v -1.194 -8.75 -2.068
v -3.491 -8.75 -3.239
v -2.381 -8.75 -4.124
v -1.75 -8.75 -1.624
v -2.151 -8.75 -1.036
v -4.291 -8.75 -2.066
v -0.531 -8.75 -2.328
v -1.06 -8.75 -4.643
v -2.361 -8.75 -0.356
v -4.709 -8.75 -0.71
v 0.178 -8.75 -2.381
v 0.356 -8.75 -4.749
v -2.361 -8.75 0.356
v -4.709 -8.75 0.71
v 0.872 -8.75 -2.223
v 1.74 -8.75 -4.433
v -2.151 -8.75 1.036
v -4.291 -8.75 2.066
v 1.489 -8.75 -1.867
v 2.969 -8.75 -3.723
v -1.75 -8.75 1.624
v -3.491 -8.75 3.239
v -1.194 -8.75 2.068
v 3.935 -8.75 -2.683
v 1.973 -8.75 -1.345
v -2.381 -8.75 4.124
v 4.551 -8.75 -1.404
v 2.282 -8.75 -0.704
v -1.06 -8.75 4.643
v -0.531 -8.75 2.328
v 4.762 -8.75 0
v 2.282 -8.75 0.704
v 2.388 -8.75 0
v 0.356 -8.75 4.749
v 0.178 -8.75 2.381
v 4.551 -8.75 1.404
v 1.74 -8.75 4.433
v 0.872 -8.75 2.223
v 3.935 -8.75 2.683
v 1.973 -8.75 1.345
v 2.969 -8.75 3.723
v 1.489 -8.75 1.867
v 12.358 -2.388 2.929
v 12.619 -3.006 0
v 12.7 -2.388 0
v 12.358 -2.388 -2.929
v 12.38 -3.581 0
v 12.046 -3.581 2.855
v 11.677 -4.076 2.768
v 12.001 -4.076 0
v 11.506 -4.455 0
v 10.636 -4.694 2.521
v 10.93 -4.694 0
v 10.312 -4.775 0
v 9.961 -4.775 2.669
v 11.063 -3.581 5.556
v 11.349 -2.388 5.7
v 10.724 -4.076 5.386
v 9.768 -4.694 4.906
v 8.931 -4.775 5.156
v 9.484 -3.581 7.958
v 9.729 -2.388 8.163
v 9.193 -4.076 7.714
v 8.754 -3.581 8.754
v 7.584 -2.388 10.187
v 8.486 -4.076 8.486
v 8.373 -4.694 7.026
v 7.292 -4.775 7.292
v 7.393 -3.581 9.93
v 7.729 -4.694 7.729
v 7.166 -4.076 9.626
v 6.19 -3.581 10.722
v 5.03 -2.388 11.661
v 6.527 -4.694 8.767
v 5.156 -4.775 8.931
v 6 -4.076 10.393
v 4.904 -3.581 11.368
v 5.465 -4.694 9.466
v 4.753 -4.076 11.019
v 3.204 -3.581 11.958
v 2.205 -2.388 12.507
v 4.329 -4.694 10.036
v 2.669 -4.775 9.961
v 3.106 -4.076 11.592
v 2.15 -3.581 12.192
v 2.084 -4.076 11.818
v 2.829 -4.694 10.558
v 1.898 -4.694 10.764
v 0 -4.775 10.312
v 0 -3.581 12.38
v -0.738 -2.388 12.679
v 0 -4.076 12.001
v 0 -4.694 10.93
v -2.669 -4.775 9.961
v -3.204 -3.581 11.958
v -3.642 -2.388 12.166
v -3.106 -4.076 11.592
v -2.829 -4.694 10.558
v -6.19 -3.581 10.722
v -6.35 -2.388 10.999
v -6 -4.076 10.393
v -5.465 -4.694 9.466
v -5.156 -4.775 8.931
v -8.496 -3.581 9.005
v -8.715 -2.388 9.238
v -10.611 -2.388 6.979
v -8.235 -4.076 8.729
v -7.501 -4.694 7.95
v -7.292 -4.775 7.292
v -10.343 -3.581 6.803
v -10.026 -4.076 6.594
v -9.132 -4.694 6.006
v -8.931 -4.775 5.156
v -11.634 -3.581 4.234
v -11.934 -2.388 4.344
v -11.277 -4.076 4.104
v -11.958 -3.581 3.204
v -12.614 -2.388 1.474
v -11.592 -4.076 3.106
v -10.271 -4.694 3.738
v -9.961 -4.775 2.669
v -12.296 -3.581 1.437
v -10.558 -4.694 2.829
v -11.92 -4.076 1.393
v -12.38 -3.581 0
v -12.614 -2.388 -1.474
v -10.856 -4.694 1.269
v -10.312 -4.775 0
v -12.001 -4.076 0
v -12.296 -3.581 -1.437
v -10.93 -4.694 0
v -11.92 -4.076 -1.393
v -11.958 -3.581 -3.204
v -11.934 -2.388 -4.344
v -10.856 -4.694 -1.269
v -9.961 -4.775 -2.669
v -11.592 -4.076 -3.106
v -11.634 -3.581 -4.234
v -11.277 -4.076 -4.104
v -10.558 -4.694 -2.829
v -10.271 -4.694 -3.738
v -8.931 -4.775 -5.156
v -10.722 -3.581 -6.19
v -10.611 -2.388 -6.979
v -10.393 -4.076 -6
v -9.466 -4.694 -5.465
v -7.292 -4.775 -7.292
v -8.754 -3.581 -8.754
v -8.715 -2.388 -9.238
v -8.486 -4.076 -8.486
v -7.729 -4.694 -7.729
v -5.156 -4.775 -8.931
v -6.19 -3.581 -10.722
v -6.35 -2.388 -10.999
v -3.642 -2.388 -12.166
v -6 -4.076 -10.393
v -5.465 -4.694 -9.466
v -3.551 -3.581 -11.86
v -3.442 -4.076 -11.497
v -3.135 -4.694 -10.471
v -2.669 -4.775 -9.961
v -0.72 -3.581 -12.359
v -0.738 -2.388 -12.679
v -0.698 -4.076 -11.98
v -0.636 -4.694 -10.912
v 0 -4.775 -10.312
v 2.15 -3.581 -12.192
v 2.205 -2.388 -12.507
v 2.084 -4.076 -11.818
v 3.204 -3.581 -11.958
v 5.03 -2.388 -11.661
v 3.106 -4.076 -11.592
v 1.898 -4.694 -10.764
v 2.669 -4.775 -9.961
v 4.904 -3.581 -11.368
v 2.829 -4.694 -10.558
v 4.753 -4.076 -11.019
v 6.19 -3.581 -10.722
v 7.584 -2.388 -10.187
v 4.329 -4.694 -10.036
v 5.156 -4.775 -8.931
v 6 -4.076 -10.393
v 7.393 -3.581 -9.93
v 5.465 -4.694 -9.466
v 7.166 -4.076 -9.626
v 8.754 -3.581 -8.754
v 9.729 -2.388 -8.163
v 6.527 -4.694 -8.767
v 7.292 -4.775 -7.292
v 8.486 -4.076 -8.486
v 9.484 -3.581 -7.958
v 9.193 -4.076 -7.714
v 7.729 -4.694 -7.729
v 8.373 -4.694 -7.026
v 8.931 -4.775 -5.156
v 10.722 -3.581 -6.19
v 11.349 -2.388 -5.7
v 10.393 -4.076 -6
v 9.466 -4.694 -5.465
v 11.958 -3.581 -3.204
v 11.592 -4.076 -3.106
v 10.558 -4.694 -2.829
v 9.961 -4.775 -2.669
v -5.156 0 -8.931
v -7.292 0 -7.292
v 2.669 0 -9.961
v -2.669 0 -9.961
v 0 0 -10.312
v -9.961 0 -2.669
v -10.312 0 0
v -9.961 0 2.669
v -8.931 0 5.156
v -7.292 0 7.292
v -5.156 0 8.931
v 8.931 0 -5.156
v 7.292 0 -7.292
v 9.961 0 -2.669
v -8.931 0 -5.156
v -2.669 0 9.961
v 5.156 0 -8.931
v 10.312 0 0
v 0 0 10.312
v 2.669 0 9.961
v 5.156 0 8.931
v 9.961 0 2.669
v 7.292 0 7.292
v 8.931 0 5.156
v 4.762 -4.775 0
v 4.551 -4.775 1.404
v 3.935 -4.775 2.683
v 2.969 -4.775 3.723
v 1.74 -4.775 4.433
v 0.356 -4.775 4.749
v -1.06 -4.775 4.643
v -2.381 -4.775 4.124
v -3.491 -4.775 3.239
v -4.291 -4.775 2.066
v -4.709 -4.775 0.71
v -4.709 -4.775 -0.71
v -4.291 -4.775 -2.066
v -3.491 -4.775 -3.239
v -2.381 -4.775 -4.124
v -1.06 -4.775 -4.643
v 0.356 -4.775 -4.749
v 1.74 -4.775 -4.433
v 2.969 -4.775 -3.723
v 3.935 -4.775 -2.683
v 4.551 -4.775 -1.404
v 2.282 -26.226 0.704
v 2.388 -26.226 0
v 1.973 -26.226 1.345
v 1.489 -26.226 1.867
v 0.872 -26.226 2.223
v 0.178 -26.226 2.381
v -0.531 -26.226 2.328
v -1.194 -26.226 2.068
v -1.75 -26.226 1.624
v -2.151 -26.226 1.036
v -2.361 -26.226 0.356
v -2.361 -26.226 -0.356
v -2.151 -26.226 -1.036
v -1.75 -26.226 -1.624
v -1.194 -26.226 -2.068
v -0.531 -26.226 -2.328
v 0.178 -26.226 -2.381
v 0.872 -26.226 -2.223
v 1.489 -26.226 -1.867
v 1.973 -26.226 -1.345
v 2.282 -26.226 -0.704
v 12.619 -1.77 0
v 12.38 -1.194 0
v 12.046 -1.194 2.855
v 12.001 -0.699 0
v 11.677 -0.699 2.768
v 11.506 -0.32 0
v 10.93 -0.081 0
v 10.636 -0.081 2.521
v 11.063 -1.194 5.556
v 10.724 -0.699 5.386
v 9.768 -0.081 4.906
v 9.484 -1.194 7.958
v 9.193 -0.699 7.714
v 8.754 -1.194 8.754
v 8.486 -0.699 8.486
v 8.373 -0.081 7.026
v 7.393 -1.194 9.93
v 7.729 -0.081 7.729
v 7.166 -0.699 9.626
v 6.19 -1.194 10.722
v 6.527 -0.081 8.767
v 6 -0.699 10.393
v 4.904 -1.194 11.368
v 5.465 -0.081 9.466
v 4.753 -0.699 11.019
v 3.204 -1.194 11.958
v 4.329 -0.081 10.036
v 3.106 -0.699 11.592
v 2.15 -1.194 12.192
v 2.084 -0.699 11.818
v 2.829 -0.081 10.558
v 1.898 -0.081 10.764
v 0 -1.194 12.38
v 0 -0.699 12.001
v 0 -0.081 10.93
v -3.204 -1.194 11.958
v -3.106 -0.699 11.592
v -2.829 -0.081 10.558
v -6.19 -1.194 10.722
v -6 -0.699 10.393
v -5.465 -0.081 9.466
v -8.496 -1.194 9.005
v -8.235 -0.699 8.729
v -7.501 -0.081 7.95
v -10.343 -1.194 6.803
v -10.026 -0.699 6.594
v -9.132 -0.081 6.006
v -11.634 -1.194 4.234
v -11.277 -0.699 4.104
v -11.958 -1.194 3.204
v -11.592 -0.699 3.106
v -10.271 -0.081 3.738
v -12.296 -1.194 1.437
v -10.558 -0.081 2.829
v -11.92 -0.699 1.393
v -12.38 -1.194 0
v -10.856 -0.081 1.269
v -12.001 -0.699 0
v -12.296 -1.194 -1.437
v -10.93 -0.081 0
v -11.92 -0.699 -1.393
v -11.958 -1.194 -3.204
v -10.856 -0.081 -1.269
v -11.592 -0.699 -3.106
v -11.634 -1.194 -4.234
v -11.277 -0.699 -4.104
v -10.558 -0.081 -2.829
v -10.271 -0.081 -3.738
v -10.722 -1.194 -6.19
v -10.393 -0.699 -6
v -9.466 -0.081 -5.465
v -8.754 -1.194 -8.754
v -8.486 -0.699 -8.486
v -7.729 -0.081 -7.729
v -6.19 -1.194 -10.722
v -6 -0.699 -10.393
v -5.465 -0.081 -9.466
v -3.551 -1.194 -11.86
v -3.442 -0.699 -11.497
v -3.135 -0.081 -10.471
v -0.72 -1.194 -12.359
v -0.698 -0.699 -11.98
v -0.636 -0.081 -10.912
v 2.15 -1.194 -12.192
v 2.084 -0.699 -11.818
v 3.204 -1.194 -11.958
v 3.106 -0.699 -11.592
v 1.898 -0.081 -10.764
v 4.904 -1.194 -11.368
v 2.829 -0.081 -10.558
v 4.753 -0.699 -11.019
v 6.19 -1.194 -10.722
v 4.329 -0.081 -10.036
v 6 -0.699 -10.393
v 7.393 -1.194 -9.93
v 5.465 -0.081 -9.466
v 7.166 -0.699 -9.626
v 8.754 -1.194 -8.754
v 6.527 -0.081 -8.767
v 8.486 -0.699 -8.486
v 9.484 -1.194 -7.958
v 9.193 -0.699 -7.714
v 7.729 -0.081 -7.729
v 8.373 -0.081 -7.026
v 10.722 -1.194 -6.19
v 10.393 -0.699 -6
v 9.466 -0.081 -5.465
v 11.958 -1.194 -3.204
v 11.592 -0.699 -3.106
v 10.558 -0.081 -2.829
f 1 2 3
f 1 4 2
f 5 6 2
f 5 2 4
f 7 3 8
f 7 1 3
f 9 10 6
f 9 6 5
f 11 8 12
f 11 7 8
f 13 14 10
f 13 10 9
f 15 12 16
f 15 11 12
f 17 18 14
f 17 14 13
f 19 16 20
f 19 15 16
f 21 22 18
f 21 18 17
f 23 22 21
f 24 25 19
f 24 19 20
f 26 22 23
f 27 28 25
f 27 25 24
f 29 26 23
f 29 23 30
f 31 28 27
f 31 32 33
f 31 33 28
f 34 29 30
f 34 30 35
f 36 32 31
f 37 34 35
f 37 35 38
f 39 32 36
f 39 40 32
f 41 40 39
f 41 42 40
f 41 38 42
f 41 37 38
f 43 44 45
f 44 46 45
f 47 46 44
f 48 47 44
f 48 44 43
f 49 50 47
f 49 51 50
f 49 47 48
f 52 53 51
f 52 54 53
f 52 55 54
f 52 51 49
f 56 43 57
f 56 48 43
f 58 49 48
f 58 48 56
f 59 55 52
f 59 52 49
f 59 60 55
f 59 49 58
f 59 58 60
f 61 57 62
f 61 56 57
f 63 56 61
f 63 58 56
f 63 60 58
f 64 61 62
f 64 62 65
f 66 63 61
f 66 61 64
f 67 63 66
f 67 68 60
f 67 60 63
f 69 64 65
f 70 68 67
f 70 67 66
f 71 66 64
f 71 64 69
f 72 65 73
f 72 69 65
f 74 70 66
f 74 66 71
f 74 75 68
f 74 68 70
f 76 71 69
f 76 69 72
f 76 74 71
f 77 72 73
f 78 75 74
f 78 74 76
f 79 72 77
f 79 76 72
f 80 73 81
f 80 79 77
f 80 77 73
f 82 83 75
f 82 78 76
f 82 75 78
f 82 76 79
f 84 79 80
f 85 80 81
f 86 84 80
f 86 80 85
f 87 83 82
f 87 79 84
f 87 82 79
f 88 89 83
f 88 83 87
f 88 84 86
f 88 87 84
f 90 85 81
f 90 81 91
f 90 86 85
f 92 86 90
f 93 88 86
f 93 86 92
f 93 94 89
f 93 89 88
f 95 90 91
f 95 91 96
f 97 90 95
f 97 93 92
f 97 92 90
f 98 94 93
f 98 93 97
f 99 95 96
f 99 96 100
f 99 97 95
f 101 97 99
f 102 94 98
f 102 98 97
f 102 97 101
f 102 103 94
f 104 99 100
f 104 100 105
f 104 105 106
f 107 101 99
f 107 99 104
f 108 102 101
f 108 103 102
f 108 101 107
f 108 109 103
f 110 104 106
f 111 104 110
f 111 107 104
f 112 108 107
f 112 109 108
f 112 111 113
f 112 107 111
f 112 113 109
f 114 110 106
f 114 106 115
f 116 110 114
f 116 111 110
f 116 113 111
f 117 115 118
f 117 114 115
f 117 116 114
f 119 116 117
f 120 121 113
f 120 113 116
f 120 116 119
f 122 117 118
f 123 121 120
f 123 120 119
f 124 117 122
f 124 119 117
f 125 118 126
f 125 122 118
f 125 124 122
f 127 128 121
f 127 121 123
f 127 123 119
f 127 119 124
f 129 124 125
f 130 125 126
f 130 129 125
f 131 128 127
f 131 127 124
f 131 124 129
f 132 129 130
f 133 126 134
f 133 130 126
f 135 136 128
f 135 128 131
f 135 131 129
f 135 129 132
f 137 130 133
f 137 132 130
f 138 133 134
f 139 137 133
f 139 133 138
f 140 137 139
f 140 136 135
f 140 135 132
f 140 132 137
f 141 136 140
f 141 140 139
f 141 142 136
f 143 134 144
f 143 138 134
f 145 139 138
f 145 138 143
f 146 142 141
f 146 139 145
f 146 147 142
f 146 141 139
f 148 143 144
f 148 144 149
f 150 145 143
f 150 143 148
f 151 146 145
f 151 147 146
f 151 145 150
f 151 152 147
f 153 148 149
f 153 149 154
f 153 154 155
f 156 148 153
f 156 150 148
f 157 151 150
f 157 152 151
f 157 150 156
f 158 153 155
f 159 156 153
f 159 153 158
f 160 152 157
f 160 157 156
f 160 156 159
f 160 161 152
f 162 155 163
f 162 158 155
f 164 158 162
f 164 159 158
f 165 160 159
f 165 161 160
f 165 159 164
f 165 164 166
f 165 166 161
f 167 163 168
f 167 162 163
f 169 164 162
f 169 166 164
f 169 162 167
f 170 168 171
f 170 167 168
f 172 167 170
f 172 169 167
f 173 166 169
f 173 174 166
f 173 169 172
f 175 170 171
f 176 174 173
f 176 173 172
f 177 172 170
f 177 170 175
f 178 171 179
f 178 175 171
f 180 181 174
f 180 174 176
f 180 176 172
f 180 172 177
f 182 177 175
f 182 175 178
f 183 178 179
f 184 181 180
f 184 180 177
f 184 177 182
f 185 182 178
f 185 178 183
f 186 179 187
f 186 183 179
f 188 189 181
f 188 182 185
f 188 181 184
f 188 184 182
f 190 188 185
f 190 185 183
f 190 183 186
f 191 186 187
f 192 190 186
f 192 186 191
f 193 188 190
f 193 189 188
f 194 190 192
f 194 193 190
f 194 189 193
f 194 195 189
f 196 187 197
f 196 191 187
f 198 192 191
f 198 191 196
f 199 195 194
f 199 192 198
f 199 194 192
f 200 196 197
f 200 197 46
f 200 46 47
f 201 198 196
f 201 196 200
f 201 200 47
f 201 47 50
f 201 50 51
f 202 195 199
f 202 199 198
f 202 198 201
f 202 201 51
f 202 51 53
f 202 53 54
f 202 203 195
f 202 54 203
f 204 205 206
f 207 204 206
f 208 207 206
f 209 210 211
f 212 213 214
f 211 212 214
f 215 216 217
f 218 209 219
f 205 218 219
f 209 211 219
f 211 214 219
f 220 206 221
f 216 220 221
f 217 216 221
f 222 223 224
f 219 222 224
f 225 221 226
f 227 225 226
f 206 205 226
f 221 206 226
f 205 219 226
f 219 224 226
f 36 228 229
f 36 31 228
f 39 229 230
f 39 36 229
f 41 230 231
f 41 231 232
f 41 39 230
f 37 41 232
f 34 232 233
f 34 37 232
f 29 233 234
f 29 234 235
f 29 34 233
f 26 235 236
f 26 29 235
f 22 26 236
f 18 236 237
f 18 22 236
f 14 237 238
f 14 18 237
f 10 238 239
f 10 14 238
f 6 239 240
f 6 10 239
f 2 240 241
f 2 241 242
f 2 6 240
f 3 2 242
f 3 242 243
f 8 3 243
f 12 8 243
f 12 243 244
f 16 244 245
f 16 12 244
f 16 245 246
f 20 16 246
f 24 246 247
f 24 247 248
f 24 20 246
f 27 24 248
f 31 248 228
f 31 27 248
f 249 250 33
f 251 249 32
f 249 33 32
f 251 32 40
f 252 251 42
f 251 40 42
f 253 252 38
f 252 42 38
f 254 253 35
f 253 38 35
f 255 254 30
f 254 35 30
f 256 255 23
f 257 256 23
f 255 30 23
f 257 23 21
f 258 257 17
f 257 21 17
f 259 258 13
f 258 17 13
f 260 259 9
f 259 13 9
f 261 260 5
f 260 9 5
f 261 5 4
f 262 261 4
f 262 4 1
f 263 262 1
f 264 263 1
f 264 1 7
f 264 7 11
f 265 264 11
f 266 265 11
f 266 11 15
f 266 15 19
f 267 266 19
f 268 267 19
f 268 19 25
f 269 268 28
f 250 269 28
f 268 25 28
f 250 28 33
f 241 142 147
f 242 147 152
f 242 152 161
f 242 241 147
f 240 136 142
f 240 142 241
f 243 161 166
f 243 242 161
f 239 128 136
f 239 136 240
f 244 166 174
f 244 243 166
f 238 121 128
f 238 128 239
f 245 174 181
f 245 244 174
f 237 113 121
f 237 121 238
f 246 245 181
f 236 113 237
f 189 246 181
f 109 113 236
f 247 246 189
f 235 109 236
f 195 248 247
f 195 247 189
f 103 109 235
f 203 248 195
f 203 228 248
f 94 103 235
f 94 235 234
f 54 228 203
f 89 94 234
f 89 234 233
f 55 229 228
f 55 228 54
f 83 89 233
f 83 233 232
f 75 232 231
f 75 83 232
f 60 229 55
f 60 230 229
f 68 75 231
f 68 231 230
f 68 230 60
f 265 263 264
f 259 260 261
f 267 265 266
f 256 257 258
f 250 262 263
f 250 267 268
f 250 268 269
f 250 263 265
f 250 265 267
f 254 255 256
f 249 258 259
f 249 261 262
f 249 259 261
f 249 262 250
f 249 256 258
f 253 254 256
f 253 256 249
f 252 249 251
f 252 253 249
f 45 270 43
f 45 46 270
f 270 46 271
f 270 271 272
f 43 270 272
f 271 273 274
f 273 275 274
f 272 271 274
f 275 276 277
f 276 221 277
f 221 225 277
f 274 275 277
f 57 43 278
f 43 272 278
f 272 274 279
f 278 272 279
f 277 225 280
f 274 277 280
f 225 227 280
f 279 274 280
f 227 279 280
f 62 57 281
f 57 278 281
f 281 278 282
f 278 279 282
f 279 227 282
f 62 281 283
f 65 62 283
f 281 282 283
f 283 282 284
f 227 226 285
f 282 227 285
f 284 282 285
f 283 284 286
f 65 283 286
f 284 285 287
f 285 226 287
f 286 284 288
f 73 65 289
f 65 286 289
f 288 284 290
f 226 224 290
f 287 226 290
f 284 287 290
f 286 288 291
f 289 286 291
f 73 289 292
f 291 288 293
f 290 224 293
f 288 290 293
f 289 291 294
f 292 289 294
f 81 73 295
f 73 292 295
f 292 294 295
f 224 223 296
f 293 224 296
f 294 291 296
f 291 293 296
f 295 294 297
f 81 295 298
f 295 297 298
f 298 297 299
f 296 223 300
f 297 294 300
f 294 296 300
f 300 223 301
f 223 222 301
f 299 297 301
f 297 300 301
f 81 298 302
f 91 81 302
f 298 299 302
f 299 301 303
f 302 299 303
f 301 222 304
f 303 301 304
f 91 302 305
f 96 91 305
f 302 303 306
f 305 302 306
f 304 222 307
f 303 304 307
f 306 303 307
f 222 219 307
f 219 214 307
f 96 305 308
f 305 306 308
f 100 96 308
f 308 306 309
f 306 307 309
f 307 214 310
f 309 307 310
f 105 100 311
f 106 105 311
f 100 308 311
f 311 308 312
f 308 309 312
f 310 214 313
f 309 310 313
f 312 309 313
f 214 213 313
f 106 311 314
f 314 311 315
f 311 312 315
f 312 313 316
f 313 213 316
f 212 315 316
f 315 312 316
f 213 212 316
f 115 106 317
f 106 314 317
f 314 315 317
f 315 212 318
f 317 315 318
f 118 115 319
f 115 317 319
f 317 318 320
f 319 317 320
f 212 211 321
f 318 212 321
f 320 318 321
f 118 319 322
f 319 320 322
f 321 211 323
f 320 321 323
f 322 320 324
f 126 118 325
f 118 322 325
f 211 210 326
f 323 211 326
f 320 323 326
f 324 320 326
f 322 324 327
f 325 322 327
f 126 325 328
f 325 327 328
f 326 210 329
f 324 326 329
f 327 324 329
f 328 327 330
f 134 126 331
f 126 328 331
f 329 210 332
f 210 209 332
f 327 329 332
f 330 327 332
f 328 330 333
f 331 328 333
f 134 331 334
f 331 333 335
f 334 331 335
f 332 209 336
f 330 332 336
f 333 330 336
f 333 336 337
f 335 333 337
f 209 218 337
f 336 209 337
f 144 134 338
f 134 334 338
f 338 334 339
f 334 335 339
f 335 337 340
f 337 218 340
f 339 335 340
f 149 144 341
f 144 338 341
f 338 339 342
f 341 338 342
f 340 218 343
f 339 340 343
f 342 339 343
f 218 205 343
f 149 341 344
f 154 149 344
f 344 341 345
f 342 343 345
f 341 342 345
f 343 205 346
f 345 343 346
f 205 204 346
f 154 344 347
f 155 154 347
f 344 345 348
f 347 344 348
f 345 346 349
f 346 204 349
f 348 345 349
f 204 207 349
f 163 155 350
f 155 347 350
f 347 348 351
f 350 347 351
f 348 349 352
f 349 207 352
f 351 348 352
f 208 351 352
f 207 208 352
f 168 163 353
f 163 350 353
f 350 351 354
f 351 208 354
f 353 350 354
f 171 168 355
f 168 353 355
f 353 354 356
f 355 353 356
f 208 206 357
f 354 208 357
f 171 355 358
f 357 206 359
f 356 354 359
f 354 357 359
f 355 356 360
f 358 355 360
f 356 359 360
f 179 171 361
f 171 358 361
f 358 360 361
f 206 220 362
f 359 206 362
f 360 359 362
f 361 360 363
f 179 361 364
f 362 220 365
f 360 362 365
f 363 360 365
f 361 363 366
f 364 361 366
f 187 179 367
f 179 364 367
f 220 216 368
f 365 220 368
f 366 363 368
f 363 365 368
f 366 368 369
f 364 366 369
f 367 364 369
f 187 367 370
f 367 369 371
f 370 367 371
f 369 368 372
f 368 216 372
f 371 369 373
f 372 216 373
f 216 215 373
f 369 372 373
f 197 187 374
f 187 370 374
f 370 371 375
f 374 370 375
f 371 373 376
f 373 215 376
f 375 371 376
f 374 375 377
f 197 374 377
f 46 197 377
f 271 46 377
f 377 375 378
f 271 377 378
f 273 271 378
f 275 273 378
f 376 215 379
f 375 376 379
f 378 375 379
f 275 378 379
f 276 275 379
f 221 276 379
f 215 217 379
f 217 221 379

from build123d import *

# Parameters (mm, degrees)
F0_R     = 12.7
F1_DEPTH = 4.7752
F2_R     = 2.38759
F3_R     = 4.7625
F4_DEPTH = 3.9751
F5_R     = 2.3876
F6_DEPTH = 17.4752


# Not quite as in the source:
# - a fillet or chamfer is up to 0.001 mm smaller than in the source, because OpenCascade refuses the exact size


with BuildPart() as f1:
    # F0 (on Front) → F1 (new body)
    with BuildSketch(Plane.XZ):
        Circle(F0_R)
    extrude(amount=F1_DEPTH)

    # F2 (radius 2.3876 in the source; OpenCascade refuses exactly that, so slightly less here)
    f2_edges = [f1.edges().sort_by_distance(p)[0] for p in [
        (-12.7, 0, 0),
        (-12.7, -4.7752, 0),
    ]]
    fillet(f2_edges, radius=F2_R)

    # F3 (on face) → F4 (join, symmetric)
    with BuildSketch(Plane.XZ.offset(4.7752)):
        Circle(F3_R)
    extrude(amount=F4_DEPTH, both=True)

    # F5 (on face) → F6 (join)
    with BuildSketch(Plane.XZ.offset(8.7503)):
        Circle(F5_R)
    extrude(amount=F6_DEPTH)


solid = f1.part
